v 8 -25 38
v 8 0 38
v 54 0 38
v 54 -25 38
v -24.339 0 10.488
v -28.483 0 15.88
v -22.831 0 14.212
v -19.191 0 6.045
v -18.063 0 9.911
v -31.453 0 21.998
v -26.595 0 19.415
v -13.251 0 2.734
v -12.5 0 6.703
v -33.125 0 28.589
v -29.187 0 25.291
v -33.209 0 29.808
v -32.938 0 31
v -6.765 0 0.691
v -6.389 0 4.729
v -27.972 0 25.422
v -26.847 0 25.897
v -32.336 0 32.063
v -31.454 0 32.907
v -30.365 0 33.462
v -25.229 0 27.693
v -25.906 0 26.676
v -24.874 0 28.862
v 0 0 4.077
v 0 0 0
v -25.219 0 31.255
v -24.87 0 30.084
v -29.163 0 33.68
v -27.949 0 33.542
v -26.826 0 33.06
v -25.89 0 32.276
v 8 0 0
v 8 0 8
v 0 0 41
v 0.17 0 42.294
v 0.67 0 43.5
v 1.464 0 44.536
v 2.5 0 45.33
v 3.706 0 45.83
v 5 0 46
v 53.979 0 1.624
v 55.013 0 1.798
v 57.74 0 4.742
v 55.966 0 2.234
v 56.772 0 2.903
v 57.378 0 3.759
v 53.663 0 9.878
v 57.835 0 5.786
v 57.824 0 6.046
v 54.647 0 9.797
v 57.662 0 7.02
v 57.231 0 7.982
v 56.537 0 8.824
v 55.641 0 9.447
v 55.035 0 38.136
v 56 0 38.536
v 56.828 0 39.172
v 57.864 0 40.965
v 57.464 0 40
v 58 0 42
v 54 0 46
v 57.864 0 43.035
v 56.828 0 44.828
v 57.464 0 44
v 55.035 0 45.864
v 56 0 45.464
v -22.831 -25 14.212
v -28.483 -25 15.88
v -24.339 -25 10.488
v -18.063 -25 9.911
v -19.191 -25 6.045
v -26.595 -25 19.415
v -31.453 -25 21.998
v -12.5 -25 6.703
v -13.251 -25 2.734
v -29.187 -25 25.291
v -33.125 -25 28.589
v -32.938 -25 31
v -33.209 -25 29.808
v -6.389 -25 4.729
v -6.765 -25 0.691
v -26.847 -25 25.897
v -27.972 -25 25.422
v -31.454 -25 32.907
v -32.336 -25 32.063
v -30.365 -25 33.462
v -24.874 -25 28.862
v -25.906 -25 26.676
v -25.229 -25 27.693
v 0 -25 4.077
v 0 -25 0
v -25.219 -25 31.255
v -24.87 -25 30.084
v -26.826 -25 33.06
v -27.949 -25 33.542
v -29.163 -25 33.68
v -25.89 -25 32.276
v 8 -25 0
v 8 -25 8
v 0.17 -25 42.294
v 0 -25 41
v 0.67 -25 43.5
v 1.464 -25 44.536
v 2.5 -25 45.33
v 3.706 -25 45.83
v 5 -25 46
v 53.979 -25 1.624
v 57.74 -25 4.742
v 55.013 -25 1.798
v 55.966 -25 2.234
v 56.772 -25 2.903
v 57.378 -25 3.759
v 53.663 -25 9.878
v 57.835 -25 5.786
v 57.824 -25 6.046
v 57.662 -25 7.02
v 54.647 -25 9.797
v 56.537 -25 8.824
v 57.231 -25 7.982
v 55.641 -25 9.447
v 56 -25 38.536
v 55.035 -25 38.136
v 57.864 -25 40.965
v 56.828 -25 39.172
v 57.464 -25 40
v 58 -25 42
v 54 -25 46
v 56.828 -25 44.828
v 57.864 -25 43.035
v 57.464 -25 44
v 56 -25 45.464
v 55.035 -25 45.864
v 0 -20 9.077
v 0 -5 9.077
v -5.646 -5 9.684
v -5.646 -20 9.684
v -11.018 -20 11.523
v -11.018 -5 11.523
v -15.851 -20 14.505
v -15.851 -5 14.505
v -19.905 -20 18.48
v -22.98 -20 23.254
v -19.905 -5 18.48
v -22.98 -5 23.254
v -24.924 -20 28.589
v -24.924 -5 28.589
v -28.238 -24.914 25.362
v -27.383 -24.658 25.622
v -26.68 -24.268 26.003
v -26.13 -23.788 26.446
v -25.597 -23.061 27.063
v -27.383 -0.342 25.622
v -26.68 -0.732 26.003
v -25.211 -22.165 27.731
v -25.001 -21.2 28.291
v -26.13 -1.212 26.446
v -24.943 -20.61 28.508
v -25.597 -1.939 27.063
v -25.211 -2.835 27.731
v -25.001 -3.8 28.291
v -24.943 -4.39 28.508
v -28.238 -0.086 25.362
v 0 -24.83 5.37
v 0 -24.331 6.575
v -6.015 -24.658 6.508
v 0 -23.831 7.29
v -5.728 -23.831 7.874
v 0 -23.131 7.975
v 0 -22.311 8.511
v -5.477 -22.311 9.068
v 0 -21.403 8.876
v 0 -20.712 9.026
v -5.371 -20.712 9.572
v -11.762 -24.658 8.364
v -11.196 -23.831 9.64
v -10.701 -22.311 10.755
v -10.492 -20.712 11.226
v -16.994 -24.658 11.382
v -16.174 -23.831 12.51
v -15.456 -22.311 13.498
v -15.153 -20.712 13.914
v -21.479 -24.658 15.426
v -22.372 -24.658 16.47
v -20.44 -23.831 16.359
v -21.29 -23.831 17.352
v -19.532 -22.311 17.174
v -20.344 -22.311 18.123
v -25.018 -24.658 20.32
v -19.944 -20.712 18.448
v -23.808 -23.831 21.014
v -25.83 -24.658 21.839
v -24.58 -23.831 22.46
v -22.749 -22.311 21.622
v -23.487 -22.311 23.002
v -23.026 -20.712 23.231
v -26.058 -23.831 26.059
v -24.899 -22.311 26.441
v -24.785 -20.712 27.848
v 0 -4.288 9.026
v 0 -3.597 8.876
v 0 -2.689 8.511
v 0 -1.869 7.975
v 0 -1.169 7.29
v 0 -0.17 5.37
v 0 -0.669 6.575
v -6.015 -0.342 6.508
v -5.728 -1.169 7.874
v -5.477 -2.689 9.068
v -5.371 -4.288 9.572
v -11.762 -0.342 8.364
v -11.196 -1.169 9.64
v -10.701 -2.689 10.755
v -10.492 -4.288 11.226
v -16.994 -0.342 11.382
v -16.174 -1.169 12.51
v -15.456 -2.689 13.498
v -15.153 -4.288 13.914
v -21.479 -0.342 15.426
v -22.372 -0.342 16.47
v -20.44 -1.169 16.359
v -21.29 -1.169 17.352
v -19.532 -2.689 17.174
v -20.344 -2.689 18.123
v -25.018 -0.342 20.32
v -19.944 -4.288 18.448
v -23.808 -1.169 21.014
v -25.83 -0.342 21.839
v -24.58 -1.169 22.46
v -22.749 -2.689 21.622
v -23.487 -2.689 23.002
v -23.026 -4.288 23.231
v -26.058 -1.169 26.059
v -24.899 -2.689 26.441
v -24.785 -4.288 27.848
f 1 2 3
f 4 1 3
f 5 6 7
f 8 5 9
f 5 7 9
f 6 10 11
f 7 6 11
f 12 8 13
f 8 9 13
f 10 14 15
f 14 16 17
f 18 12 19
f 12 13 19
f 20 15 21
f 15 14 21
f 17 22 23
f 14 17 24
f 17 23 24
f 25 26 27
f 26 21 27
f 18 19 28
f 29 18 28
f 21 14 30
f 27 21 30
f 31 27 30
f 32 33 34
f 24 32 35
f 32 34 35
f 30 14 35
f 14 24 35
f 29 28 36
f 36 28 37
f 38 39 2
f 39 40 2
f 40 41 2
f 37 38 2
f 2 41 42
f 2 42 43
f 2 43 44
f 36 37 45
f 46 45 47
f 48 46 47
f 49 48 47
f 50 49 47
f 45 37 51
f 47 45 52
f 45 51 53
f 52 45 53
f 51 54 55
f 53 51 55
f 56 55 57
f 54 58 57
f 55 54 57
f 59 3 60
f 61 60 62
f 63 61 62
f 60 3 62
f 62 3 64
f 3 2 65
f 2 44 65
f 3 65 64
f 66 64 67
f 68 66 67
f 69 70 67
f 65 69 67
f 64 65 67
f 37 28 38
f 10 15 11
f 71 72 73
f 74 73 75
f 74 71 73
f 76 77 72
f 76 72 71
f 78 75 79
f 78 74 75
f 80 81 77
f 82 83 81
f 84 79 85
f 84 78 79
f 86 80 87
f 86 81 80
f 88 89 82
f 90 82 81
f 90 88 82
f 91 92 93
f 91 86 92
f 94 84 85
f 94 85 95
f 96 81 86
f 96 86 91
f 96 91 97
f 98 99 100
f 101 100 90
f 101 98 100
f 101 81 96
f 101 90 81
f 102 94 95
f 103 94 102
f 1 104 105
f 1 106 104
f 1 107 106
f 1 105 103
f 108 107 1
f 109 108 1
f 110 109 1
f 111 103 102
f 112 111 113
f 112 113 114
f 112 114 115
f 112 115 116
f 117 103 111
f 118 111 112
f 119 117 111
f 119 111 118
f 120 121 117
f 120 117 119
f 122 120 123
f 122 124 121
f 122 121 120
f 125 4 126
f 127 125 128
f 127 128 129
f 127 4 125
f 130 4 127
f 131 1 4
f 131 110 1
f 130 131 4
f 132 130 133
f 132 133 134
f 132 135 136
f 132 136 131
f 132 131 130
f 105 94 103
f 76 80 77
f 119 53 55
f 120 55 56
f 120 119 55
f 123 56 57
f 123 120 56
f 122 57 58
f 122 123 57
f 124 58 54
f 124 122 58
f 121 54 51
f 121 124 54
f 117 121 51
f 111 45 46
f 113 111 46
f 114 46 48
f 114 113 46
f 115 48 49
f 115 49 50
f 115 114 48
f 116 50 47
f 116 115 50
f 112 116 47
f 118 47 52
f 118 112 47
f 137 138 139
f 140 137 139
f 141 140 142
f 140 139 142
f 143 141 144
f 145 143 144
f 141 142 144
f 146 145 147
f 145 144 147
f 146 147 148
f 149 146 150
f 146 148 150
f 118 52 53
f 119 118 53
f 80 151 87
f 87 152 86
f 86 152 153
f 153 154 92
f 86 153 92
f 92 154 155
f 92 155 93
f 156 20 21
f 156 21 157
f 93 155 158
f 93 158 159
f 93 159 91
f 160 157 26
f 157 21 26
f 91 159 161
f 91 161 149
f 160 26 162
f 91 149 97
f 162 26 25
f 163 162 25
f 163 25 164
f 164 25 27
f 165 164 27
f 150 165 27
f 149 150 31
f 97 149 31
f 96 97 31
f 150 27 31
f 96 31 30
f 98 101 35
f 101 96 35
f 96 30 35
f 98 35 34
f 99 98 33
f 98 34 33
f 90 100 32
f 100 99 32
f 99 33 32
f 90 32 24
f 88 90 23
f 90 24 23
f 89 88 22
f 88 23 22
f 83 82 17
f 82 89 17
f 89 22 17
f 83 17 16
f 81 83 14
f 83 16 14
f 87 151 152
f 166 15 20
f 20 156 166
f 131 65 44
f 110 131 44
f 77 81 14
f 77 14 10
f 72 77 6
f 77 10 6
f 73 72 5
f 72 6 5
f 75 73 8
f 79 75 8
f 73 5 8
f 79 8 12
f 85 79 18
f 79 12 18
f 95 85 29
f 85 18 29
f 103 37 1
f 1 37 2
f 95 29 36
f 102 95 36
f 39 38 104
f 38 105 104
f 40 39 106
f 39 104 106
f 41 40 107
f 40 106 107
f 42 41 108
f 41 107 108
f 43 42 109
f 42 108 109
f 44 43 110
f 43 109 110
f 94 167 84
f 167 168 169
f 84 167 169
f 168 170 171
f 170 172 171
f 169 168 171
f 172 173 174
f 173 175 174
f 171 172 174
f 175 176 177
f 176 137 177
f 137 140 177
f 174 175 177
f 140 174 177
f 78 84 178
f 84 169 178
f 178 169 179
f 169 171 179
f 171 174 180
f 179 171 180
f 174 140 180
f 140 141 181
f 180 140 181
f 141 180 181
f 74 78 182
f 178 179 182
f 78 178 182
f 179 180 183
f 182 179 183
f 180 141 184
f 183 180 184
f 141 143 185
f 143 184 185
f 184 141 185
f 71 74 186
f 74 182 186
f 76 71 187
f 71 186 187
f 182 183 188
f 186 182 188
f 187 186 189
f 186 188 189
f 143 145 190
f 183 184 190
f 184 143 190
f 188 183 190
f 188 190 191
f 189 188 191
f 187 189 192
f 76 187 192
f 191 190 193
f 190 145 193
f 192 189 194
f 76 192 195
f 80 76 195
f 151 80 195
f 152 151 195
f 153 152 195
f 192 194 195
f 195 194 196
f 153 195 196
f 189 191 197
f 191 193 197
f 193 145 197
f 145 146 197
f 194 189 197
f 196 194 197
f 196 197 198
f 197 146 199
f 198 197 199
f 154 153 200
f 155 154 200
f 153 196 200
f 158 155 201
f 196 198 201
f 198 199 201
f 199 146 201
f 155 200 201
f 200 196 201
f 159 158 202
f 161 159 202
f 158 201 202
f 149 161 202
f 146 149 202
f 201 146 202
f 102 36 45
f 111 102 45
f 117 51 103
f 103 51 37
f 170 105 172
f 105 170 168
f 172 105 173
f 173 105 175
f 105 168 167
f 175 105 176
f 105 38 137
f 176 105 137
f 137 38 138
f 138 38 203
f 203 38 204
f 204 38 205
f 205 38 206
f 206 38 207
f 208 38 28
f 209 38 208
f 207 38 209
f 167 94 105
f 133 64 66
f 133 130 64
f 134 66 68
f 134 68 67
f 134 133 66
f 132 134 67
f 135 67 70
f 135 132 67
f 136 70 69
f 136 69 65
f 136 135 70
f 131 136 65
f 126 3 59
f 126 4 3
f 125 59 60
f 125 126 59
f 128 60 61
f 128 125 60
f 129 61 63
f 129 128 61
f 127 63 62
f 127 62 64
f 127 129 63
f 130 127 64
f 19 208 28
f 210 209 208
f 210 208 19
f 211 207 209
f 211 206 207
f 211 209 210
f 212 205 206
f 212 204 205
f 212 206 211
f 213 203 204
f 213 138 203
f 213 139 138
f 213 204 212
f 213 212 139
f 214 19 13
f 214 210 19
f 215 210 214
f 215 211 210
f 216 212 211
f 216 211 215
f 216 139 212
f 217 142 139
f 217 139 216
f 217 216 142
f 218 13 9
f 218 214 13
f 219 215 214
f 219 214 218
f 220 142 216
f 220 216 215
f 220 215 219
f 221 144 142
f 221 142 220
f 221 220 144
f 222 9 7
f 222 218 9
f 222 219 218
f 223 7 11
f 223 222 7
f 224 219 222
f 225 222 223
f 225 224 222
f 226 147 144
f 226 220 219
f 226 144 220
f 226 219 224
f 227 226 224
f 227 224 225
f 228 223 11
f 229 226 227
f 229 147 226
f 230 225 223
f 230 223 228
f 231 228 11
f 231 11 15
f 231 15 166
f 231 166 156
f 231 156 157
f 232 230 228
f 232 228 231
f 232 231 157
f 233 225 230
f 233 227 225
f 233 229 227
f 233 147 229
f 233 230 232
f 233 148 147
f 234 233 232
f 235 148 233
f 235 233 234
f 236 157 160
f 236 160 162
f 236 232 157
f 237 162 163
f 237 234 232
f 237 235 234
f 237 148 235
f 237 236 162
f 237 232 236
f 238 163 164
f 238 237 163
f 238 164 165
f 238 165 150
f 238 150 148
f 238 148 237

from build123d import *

# Parameters (mm, degrees)
F0_W     = 50
F0_H     = 8
F1_DEPTH = 25
F2_R     = 3.99999
F3_R     = 5


# Not quite as in the source:
# - a fillet or chamfer is up to 0.001 mm smaller than in the source, because OpenCascade refuses the exact size


with BuildPart() as f1:
    # F0 (on Front) → F1 (new body)
    with BuildSketch(Plane.XZ):
        with BuildLine():
            ThreePointArc((-33.1246824974, 28.5893382254), (-21.8780417926, 8.1356985419), (0, 0))
            Line((0, 0), (0, 9.0772153518))
            ThreePointArc((0, 9.0772153518), (-15.8507153639, 14.5046379043), (-24.9239347471, 28.5893382254))
            ThreePointArc((-24.9239347471, 28.5893382254), (-29.0243086222, 33.6818376736), (-33.1246824974, 28.5893382254))
        make_face()
        with Locations((33, 42)):
            Rectangle(F0_W, F0_H)
        Polygon((57.6595105231, 10.0428396836), (8, 8), (57.743546671, 8), align=None)
        Polygon((0, 9.0772153518), (0, 0), (8, 0), (8, 8), (8, 38), (8, 46), (0, 46), align=None)
        Polygon((8, 8), (8, 0), (58, 1.7658608791), (57.743546671, 8), align=None)
    extrude(amount=F1_DEPTH)

    # F2 (radius 4 in the source; OpenCascade refuses exactly that, so slightly less here)
    f2_edges = [f1.edges().sort_by_distance(p)[0] for p in [
        (58, -12.5, 46),
        (58, -12.5, 38),
        (57.659511, -12.5, 10.04284),
        (58, -12.5, 1.765861),
    ]]
    fillet(f2_edges, radius=F2_R)

    # F3
    f3_edges = [f1.edges().sort_by_distance(p)[0] for p in [
        (-15.850715, -25, 14.504638),
        (-15.850715, 0, 14.504638),
        (0, -12.5, 46),
    ]]
    fillet(f3_edges, radius=F3_R)


solid = f1.part
